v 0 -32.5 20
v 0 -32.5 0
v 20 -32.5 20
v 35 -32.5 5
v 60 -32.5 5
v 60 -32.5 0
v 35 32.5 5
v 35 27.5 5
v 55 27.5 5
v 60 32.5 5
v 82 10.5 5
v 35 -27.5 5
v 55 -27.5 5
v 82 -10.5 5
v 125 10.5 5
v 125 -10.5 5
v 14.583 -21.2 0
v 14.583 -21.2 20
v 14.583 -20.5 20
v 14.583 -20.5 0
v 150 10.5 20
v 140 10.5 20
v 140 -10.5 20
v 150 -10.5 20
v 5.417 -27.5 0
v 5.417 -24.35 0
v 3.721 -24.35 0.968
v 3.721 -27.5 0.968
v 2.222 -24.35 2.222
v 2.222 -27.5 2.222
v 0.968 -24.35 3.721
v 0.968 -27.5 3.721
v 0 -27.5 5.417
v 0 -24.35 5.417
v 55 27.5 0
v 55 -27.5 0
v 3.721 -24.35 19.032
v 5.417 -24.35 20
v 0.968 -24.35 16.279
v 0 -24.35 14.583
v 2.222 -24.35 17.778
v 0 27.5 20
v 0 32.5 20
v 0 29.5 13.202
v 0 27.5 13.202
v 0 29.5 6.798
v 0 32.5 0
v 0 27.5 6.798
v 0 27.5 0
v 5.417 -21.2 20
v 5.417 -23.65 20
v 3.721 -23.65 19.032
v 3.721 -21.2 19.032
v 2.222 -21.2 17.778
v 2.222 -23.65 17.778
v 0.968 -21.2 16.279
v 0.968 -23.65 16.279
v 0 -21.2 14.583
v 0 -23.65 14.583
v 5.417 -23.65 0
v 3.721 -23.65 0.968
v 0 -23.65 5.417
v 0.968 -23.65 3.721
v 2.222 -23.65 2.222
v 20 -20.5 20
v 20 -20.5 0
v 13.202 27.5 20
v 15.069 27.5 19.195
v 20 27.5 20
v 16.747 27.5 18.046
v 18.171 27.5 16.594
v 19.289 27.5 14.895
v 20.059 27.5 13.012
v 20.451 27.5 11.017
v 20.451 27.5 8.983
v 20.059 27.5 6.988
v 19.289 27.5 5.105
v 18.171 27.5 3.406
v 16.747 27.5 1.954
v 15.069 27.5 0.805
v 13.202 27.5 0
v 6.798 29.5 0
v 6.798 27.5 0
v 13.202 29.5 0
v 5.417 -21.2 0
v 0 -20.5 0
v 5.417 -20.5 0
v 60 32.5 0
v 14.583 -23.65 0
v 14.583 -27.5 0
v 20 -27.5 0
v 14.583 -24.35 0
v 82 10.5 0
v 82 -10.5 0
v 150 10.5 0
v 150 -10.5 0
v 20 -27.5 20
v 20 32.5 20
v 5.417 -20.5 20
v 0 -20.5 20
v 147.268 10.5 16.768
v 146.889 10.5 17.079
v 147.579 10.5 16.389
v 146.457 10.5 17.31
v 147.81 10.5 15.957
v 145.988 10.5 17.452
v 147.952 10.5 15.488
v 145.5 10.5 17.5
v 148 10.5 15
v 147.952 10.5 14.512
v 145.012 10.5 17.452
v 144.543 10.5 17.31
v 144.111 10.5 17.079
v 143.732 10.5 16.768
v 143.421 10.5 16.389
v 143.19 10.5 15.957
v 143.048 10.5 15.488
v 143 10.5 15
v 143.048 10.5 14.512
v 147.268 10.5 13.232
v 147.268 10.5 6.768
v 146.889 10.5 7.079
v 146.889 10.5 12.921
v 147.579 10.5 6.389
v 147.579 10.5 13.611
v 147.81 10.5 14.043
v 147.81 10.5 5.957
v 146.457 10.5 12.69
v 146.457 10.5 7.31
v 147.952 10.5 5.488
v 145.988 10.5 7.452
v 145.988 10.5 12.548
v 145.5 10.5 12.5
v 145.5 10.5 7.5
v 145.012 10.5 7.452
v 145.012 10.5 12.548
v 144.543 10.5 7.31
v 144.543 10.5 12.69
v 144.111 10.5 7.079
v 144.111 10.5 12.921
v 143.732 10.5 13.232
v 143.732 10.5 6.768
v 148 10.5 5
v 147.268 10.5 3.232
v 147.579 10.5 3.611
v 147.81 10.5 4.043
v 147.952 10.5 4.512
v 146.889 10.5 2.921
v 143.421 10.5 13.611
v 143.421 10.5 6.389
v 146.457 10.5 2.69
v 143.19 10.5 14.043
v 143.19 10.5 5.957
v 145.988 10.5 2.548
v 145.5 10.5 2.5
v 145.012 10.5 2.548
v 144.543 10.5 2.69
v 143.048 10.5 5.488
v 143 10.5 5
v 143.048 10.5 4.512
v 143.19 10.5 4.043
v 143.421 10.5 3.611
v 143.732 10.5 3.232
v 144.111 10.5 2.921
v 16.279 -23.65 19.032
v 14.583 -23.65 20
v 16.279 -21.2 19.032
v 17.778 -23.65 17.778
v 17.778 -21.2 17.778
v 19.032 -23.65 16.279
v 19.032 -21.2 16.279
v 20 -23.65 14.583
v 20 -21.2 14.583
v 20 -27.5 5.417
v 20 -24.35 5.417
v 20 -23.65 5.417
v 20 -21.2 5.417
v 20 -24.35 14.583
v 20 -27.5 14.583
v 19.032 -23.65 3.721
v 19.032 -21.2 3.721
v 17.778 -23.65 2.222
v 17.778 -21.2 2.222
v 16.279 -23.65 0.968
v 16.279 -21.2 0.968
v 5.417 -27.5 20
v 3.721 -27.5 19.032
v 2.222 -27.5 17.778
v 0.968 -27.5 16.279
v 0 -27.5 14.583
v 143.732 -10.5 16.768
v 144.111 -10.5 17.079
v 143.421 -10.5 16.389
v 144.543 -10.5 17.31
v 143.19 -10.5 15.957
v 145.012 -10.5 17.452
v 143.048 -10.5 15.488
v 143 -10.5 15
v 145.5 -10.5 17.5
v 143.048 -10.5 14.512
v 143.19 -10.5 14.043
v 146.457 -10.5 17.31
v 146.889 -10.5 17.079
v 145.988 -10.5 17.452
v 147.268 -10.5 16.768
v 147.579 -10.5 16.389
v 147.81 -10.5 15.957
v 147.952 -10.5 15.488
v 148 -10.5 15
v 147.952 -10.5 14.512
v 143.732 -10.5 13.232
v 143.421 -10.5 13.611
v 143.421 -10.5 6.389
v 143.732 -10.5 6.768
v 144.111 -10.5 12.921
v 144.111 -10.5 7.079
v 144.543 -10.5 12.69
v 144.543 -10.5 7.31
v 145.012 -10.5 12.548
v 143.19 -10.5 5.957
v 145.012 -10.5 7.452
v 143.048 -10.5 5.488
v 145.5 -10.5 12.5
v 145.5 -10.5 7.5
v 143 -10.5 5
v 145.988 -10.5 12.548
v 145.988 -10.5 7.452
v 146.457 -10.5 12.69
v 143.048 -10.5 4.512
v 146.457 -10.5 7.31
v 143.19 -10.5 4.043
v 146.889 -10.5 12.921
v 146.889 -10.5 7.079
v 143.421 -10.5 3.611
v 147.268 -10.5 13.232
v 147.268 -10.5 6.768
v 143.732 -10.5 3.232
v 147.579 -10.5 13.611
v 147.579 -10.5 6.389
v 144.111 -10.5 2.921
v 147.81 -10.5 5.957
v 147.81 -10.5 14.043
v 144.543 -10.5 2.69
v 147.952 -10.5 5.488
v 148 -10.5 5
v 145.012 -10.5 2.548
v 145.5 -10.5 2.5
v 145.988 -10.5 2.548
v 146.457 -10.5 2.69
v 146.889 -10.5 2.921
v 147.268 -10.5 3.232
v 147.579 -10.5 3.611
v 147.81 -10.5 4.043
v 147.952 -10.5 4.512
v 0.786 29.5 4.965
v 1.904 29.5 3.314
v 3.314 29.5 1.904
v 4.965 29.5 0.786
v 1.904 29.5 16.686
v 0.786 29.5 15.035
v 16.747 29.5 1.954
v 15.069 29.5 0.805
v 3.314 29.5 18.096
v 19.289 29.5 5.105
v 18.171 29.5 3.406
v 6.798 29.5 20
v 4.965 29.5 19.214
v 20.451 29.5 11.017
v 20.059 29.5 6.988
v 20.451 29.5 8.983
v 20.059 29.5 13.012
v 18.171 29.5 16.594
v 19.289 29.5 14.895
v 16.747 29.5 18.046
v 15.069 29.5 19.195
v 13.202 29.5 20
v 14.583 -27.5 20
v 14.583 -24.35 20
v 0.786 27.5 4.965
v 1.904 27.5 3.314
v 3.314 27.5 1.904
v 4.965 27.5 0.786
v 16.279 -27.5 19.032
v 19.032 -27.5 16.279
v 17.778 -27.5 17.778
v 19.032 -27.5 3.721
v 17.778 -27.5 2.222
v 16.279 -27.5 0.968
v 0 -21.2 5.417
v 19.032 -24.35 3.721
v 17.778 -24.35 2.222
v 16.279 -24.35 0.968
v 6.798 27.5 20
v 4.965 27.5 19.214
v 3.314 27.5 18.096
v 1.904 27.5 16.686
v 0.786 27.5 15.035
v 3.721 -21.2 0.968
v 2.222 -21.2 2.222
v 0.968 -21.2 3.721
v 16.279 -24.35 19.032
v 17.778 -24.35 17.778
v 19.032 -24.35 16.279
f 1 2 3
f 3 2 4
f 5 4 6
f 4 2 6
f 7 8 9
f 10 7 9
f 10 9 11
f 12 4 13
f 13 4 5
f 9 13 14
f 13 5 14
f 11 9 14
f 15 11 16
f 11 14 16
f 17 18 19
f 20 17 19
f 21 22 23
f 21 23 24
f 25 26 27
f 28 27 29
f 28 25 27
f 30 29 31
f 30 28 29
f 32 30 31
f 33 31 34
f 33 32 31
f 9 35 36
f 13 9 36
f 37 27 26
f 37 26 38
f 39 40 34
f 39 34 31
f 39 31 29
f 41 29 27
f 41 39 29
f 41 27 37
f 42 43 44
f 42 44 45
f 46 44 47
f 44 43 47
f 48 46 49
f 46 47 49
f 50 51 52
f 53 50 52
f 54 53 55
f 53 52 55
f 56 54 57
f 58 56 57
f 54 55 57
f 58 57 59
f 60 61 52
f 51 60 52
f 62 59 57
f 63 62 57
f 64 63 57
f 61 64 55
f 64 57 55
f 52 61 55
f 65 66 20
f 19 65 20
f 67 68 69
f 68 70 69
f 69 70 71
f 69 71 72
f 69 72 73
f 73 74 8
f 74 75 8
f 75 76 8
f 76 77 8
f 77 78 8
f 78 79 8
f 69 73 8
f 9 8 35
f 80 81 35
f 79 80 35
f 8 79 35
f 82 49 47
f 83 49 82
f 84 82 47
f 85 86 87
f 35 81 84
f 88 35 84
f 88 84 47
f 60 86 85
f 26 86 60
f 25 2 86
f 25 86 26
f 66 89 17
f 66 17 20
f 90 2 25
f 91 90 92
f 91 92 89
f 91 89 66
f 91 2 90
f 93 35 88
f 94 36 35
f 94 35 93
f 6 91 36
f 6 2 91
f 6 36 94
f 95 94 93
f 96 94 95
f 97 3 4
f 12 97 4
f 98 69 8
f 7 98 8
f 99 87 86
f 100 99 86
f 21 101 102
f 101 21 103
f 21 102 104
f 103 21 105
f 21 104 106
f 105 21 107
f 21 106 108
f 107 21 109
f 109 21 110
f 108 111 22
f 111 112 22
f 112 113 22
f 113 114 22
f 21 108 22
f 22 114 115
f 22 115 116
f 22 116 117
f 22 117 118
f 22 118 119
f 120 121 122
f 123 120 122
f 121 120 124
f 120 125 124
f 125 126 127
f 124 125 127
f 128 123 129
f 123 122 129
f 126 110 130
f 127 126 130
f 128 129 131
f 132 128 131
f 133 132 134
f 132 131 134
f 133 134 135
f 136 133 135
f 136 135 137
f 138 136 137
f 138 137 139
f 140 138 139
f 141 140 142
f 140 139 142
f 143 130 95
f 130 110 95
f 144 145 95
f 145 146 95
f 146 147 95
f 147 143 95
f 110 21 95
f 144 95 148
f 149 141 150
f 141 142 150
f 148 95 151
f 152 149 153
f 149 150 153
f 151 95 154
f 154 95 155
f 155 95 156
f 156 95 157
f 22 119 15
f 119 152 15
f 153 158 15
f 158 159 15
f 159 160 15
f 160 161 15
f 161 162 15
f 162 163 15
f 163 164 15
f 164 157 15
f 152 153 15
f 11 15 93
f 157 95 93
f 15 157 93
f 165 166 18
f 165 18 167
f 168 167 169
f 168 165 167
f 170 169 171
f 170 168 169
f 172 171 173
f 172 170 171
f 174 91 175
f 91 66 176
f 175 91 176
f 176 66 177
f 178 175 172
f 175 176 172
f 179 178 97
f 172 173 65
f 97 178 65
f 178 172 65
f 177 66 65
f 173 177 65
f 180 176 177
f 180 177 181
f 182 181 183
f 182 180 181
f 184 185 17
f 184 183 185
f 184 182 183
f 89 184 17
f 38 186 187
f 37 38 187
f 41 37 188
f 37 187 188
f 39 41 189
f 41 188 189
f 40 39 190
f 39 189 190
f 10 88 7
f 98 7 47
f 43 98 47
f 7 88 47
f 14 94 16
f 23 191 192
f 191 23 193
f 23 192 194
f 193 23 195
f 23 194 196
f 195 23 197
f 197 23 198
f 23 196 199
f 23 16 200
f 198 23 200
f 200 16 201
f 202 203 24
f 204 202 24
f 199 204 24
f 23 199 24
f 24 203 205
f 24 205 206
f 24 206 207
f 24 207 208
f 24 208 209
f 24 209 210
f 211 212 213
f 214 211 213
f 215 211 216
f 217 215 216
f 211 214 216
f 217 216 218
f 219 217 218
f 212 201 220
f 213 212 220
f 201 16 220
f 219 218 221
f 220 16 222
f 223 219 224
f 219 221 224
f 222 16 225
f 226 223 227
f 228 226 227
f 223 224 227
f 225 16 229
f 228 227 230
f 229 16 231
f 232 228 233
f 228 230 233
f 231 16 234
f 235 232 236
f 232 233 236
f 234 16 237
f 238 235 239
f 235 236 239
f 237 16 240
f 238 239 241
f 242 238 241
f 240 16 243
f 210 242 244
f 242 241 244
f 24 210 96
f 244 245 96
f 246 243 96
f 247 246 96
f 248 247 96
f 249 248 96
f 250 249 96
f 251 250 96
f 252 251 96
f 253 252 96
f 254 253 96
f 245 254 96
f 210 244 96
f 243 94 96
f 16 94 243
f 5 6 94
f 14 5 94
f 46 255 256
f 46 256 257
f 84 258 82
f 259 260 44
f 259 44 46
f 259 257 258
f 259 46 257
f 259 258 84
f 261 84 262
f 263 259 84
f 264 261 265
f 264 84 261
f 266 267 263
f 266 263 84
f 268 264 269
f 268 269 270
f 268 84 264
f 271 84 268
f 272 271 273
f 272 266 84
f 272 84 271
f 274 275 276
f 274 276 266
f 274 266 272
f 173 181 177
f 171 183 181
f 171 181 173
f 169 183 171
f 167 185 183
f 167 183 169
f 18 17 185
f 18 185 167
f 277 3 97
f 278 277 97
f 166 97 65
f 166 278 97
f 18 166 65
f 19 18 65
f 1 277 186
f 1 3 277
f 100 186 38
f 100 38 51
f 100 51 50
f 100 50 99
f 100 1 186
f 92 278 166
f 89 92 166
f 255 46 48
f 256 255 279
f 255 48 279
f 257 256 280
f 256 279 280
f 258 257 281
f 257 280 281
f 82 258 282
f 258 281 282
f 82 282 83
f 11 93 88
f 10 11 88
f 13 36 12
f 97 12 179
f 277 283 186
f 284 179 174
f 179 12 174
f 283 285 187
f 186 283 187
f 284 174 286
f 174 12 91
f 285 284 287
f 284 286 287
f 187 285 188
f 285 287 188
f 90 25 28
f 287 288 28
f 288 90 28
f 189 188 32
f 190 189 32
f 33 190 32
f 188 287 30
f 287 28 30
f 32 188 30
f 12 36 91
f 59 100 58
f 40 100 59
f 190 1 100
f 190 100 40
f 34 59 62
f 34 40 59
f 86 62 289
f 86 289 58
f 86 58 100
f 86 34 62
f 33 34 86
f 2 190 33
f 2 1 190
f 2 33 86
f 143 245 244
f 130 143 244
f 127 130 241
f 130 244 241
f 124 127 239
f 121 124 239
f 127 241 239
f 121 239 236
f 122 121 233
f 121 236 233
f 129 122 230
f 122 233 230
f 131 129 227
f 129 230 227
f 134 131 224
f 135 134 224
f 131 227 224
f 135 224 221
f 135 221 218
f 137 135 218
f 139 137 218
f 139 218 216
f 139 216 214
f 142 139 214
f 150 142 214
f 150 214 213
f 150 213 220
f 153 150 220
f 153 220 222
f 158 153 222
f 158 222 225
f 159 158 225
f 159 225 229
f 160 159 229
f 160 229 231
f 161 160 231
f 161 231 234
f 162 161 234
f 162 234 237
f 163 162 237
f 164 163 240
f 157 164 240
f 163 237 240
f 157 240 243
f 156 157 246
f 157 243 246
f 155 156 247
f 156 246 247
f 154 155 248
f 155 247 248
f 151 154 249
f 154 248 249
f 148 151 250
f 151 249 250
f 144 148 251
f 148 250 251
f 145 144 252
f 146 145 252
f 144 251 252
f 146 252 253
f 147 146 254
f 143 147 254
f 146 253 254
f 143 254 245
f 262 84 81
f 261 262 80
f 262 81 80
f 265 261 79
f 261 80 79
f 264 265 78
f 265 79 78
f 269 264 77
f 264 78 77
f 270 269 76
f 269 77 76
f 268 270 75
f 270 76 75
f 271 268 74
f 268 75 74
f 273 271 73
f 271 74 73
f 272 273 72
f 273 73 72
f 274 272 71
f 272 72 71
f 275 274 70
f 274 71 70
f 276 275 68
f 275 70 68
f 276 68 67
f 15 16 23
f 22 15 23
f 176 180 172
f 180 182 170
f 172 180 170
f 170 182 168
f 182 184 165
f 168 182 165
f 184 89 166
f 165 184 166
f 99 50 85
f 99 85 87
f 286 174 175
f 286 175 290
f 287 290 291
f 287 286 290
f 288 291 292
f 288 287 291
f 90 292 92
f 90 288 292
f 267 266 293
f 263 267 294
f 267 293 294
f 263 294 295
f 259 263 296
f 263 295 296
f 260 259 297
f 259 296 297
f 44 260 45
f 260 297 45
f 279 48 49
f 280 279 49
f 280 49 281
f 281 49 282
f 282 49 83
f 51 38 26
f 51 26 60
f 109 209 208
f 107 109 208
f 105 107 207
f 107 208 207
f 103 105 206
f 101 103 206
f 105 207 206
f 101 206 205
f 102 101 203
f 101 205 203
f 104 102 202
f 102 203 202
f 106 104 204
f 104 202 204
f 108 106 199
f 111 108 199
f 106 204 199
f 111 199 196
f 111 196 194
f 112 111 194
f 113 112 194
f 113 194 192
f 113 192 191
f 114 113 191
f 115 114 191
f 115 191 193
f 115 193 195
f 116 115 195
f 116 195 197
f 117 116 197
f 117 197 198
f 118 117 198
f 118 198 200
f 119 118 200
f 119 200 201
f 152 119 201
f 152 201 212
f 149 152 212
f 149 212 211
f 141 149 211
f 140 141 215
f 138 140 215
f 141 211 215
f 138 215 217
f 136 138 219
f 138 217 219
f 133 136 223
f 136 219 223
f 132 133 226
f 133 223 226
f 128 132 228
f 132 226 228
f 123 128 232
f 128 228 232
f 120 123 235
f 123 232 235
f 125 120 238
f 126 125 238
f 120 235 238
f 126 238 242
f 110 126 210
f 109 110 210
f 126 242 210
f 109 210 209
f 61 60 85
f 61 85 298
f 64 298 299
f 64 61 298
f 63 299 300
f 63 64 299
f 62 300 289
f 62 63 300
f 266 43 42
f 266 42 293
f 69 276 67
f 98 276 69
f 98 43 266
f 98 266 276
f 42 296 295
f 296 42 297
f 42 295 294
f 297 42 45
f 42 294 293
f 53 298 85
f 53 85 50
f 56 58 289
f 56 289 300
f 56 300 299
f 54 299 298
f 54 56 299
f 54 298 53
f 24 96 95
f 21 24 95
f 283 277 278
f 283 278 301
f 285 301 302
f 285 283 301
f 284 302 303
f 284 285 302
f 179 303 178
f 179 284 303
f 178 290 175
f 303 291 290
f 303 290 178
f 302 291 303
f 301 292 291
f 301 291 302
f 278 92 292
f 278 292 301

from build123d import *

# Parameters (mm, degrees)
EXTRUSION1_DEPTH        = 20
ESQUISSE3_R             = 2.5
ENL_V_MAT_EXTRU_1_DEPTH = 44
ENL_V_MAT_EXTRU_2_DEPTH = 66
ESQUISSE5_R             = 10.5
ENL_V_MAT_EXTRU_3_DEPTH = 2
EXTRUSION2_DEPTH        = 7
ESQUISSE7_W             = 20
ESQUISSE7_H             = 0.7
EXTRUSION3_DEPTH        = 20
ESQUISSE8_W             = 9.16515139
ESQUISSE8_H             = 7
ENL_V_MAT_EXTRU_4_DEPTH = 21


with BuildPart() as part:
    # Esquisse2 → Extrusion1 (new body)
    with BuildSketch(Plane.XY):
        Polygon((0, 32.5), (0, 27.5), (55, 27.5), (55, -27.5), (0, -27.5), (0, -32.5), (60, -32.5), (82, -10.5), (150, -10.5), (150, 10.5), (82, 10.5), (60, 32.5), align=None)
    extrude(amount=EXTRUSION1_DEPTH)

    # Esquisse3 → Enlèv. mat.-Extru.1 (cut, through all)
    with BuildSketch(Plane.XZ.offset(10.5)):
        with Locations((145.5, 15)):
            Circle(ESQUISSE3_R)
        with Locations((145.5, 5)):
            Circle(ESQUISSE3_R)
    extrude(amount=-ENL_V_MAT_EXTRU_1_DEPTH, mode=Mode.SUBTRACT)

    # Esquisse4 → Enlèv. mat.-Extru.2 (cut, through all)
    with BuildSketch(Plane.XZ.offset(32.5)):
        Polygon((20, 20), (35, 5), (125, 5), (140, 20), align=None)
    extrude(amount=-ENL_V_MAT_EXTRU_2_DEPTH, mode=Mode.SUBTRACT)

    # Esquisse5 → Enlèv. mat.-Extru.3 (cut)
    with BuildSketch(Plane.XZ.offset(-27.5)):
        with Locations((10, 10)):
            Circle(ESQUISSE5_R)
    extrude(amount=-ENL_V_MAT_EXTRU_3_DEPTH, mode=Mode.SUBTRACT)

    # Esquisse6 → Extrusion2 (add)
    with BuildSketch(Plane(origin=(0, -27.5, 0), x_dir=(1, 0, 0), z_dir=(0, 1, 0))):
        with BuildLine():
            Line((14.582575695, 0), (20, 0))
            Line((20, 0), (20, -5.417424305))
            ThreePointArc((20, -5.417424305), (17.778174593, -2.221825407), (14.582575695, 0))
        make_face()
        with BuildLine():
            Line((0, 0), (5.417424305, 0))
            ThreePointArc((5.417424305, 0), (2.221825407, -2.221825407), (0, -5.417424305))
            Line((0, -5.417424305), (0, 0))
        make_face()
        with BuildLine():
            Line((0, -20), (5.417424305, -20))
            ThreePointArc((5.417424305, -20), (2.221825407, -17.778174593), (0, -14.582575695))
            Line((0, -14.582575695), (0, -20))
        make_face()
        with BuildLine():
            Line((20, -14.582575695), (20, -20))
            Line((20, -20), (14.582575695, -20))
            ThreePointArc((14.582575695, -20), (17.778174593, -17.778174593), (20, -14.582575695))
        make_face()
    extrude(amount=EXTRUSION2_DEPTH)

    # Esquisse7 → Extrusion3 (add)
    with BuildSketch(Plane.ZY):
        with Locations((10, -20.85)):
            Rectangle(ESQUISSE7_W, ESQUISSE7_H)
        with Locations((10, -24)):
            Rectangle(ESQUISSE7_W, ESQUISSE7_H)
    extrude(amount=-EXTRUSION3_DEPTH)

    # Esquisse8 → Enlèv. mat.-Extru.4 (cut, through all)
    with BuildSketch(Plane.XY.offset(20)):
        with Locations((10, -24)):
            Rectangle(ESQUISSE8_W, ESQUISSE8_H)
    extrude(amount=-ENL_V_MAT_EXTRU_4_DEPTH, mode=Mode.SUBTRACT)


solid = part.part
